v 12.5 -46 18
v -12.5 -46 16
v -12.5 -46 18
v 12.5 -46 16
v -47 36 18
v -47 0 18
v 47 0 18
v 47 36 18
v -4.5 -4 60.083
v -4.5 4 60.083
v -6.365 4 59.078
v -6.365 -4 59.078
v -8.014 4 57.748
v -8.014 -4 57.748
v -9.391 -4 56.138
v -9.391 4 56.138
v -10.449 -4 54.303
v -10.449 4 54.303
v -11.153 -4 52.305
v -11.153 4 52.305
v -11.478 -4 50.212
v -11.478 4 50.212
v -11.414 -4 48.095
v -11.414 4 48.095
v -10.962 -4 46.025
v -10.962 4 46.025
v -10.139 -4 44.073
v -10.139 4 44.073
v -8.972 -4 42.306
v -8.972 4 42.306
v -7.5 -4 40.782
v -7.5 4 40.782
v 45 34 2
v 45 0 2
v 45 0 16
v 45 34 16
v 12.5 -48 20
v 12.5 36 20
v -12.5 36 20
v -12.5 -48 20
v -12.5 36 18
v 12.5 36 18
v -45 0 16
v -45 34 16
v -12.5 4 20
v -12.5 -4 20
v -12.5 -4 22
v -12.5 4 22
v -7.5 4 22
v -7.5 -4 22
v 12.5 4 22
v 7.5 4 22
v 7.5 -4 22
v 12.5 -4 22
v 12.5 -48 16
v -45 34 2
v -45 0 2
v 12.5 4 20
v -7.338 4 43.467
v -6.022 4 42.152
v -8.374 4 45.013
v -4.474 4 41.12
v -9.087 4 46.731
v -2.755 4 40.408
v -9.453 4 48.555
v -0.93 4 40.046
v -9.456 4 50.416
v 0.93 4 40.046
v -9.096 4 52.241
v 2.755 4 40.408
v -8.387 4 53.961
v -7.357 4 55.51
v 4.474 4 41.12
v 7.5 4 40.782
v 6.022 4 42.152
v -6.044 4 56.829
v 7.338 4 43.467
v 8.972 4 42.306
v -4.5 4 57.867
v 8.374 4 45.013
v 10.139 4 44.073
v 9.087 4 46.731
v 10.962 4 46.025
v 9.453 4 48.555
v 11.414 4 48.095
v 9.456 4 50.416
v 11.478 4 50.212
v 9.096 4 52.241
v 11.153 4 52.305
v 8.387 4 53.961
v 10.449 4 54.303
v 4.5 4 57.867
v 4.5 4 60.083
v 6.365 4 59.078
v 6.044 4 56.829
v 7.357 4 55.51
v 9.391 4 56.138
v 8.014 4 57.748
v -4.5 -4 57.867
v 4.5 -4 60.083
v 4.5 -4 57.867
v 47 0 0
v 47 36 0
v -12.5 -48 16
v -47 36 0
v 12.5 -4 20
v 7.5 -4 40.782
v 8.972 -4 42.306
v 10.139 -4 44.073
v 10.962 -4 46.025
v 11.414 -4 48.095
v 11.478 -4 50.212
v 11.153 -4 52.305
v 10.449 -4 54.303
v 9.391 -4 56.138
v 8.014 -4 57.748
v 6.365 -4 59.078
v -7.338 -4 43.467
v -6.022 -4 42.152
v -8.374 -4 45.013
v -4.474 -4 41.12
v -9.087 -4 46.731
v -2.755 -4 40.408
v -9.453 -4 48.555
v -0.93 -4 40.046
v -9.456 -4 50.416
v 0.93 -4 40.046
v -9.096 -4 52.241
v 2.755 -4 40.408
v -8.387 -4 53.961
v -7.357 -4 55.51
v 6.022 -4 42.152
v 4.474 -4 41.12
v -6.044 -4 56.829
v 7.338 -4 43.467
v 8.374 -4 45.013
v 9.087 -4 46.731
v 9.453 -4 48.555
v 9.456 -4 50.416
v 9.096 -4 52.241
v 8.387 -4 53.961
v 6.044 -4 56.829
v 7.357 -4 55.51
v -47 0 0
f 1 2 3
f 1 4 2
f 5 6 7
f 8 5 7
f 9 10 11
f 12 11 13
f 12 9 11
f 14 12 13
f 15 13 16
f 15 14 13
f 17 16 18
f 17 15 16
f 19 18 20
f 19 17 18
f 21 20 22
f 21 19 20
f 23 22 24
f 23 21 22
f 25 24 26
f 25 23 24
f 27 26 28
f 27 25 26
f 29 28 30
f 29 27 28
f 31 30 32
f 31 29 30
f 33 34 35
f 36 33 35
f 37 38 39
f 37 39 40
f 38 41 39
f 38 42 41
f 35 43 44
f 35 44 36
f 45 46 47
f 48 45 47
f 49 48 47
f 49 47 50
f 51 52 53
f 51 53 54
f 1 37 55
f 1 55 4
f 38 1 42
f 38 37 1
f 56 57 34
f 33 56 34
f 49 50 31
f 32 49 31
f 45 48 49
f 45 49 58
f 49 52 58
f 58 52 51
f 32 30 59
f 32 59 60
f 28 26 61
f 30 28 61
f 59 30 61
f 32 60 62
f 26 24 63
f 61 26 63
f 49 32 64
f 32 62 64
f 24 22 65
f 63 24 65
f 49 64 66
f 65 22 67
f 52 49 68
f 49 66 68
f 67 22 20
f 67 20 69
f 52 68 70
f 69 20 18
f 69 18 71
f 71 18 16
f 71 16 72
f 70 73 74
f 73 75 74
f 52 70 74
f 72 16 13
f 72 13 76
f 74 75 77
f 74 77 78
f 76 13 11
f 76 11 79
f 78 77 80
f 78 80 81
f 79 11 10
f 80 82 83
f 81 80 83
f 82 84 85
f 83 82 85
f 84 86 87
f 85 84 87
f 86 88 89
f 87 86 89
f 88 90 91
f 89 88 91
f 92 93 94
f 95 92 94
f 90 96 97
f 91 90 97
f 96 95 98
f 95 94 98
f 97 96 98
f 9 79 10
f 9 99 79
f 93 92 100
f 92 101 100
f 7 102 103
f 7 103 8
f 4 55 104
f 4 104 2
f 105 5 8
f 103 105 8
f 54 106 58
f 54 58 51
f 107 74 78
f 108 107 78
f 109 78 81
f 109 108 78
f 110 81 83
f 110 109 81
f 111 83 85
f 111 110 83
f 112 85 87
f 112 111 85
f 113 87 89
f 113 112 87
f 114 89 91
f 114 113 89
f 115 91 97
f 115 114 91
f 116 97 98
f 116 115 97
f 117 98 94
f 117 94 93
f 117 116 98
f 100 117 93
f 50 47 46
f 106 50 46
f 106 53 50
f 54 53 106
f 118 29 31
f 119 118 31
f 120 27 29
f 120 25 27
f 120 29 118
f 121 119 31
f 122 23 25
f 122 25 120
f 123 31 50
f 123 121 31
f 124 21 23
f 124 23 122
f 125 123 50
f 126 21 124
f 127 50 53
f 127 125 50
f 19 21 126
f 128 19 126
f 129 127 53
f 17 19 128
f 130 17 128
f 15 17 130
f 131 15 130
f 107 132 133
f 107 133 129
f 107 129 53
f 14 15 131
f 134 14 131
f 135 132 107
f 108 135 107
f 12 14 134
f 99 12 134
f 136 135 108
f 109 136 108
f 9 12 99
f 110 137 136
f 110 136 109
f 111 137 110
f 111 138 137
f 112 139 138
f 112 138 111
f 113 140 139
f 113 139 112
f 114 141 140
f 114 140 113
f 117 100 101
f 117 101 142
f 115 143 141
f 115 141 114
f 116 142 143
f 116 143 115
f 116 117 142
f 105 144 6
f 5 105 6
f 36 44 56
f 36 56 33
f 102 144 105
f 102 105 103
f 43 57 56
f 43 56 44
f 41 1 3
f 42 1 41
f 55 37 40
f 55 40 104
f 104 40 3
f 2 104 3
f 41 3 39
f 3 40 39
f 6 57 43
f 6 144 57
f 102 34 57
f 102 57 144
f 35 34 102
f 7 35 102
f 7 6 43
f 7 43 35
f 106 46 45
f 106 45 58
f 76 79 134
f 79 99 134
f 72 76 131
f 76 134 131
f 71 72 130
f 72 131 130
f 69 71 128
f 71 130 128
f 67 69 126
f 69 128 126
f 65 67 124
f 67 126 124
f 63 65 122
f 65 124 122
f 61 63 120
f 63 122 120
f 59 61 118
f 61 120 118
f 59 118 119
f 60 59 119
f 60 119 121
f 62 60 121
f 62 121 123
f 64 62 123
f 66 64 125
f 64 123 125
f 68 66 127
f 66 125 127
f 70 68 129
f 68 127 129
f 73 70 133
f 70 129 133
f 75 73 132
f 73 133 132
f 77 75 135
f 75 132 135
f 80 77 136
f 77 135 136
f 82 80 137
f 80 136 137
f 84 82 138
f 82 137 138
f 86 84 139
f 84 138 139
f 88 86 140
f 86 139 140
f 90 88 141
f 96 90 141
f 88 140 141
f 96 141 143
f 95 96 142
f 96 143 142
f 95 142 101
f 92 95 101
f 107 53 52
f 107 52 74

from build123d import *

# Parameters (mm, degrees)
F0_W      = 94
F0_H      = 18
F1_DEPTH  = 36
F2_T      = -2
F4_DEPTH  = 12.5
F5_W      = 25
F5_H      = 2
F6_DEPTH  = 4
F7_W      = 15
F7_H      = 25
F8_DEPTH  = 4
F9_R      = 11.5
F10_DEPTH = 4
F11_R     = 9.5
F12_DEPTH = 17.7
F13_W     = 9
F13_H     = 25
F14_DEPTH = 12.5


with BuildPart() as f1:
    # F0 (on Front) → F1 (new body)
    with BuildSketch(Plane.XZ):
        with Locations((0, 9)):
            Rectangle(F0_W, F0_H)
    extrude(amount=-F1_DEPTH)

    # F2
    f2_openings = [f1.faces().sort_by_distance(p)[0] for p in [
        (0, 0, 9),
    ]]
    offset(amount=F2_T, openings=f2_openings)


with BuildPart() as f4:
    # F3 (on Right) → F4 (new body, symmetric)
    with BuildSketch(Plane.YZ):
        Polygon((0, 18), (36, 18), (36, 20), (-48, 20), (-48, 18), (-48, 16), (-46, 16), (-46, 17), (-46, 18), (-44.692099, 18), align=None)
    extrude(amount=F4_DEPTH, both=True)


with BuildPart() as f6:
    # F5 (on Front) → F6 (new body, symmetric)
    with BuildSketch(Plane.XZ):
        with Locations((0, 21)):
            Rectangle(F5_W, F5_H)
    extrude(amount=F6_DEPTH, both=True)

    # F7 (on Front) → F8 (join, symmetric)
    with BuildSketch(Plane.XZ):
        with Locations((0, 34.5)):
            Rectangle(F7_W, F7_H)
    extrude(amount=F8_DEPTH, both=True)

    # F9 (on Front) → F10 (join, symmetric)
    with BuildSketch(Plane.XZ):
        with Locations((0, 49.5)):
            Circle(F9_R)
    extrude(amount=F10_DEPTH, both=True)

    # F11 (on Front) → F12 (cut, symmetric)
    with BuildSketch(Plane.XZ):
        with Locations((0, 49.5)):
            Circle(F11_R)
    extrude(amount=F12_DEPTH, both=True, mode=Mode.SUBTRACT)

    # F13 (on Front) → F14 (cut, symmetric)
    with BuildSketch(Plane.XZ):
        with Locations((0, 59.5)):
            Rectangle(F13_W, F13_H)
    extrude(amount=F14_DEPTH, both=True, mode=Mode.SUBTRACT)


solid = Compound([f1.part, f4.part, f6.part])
